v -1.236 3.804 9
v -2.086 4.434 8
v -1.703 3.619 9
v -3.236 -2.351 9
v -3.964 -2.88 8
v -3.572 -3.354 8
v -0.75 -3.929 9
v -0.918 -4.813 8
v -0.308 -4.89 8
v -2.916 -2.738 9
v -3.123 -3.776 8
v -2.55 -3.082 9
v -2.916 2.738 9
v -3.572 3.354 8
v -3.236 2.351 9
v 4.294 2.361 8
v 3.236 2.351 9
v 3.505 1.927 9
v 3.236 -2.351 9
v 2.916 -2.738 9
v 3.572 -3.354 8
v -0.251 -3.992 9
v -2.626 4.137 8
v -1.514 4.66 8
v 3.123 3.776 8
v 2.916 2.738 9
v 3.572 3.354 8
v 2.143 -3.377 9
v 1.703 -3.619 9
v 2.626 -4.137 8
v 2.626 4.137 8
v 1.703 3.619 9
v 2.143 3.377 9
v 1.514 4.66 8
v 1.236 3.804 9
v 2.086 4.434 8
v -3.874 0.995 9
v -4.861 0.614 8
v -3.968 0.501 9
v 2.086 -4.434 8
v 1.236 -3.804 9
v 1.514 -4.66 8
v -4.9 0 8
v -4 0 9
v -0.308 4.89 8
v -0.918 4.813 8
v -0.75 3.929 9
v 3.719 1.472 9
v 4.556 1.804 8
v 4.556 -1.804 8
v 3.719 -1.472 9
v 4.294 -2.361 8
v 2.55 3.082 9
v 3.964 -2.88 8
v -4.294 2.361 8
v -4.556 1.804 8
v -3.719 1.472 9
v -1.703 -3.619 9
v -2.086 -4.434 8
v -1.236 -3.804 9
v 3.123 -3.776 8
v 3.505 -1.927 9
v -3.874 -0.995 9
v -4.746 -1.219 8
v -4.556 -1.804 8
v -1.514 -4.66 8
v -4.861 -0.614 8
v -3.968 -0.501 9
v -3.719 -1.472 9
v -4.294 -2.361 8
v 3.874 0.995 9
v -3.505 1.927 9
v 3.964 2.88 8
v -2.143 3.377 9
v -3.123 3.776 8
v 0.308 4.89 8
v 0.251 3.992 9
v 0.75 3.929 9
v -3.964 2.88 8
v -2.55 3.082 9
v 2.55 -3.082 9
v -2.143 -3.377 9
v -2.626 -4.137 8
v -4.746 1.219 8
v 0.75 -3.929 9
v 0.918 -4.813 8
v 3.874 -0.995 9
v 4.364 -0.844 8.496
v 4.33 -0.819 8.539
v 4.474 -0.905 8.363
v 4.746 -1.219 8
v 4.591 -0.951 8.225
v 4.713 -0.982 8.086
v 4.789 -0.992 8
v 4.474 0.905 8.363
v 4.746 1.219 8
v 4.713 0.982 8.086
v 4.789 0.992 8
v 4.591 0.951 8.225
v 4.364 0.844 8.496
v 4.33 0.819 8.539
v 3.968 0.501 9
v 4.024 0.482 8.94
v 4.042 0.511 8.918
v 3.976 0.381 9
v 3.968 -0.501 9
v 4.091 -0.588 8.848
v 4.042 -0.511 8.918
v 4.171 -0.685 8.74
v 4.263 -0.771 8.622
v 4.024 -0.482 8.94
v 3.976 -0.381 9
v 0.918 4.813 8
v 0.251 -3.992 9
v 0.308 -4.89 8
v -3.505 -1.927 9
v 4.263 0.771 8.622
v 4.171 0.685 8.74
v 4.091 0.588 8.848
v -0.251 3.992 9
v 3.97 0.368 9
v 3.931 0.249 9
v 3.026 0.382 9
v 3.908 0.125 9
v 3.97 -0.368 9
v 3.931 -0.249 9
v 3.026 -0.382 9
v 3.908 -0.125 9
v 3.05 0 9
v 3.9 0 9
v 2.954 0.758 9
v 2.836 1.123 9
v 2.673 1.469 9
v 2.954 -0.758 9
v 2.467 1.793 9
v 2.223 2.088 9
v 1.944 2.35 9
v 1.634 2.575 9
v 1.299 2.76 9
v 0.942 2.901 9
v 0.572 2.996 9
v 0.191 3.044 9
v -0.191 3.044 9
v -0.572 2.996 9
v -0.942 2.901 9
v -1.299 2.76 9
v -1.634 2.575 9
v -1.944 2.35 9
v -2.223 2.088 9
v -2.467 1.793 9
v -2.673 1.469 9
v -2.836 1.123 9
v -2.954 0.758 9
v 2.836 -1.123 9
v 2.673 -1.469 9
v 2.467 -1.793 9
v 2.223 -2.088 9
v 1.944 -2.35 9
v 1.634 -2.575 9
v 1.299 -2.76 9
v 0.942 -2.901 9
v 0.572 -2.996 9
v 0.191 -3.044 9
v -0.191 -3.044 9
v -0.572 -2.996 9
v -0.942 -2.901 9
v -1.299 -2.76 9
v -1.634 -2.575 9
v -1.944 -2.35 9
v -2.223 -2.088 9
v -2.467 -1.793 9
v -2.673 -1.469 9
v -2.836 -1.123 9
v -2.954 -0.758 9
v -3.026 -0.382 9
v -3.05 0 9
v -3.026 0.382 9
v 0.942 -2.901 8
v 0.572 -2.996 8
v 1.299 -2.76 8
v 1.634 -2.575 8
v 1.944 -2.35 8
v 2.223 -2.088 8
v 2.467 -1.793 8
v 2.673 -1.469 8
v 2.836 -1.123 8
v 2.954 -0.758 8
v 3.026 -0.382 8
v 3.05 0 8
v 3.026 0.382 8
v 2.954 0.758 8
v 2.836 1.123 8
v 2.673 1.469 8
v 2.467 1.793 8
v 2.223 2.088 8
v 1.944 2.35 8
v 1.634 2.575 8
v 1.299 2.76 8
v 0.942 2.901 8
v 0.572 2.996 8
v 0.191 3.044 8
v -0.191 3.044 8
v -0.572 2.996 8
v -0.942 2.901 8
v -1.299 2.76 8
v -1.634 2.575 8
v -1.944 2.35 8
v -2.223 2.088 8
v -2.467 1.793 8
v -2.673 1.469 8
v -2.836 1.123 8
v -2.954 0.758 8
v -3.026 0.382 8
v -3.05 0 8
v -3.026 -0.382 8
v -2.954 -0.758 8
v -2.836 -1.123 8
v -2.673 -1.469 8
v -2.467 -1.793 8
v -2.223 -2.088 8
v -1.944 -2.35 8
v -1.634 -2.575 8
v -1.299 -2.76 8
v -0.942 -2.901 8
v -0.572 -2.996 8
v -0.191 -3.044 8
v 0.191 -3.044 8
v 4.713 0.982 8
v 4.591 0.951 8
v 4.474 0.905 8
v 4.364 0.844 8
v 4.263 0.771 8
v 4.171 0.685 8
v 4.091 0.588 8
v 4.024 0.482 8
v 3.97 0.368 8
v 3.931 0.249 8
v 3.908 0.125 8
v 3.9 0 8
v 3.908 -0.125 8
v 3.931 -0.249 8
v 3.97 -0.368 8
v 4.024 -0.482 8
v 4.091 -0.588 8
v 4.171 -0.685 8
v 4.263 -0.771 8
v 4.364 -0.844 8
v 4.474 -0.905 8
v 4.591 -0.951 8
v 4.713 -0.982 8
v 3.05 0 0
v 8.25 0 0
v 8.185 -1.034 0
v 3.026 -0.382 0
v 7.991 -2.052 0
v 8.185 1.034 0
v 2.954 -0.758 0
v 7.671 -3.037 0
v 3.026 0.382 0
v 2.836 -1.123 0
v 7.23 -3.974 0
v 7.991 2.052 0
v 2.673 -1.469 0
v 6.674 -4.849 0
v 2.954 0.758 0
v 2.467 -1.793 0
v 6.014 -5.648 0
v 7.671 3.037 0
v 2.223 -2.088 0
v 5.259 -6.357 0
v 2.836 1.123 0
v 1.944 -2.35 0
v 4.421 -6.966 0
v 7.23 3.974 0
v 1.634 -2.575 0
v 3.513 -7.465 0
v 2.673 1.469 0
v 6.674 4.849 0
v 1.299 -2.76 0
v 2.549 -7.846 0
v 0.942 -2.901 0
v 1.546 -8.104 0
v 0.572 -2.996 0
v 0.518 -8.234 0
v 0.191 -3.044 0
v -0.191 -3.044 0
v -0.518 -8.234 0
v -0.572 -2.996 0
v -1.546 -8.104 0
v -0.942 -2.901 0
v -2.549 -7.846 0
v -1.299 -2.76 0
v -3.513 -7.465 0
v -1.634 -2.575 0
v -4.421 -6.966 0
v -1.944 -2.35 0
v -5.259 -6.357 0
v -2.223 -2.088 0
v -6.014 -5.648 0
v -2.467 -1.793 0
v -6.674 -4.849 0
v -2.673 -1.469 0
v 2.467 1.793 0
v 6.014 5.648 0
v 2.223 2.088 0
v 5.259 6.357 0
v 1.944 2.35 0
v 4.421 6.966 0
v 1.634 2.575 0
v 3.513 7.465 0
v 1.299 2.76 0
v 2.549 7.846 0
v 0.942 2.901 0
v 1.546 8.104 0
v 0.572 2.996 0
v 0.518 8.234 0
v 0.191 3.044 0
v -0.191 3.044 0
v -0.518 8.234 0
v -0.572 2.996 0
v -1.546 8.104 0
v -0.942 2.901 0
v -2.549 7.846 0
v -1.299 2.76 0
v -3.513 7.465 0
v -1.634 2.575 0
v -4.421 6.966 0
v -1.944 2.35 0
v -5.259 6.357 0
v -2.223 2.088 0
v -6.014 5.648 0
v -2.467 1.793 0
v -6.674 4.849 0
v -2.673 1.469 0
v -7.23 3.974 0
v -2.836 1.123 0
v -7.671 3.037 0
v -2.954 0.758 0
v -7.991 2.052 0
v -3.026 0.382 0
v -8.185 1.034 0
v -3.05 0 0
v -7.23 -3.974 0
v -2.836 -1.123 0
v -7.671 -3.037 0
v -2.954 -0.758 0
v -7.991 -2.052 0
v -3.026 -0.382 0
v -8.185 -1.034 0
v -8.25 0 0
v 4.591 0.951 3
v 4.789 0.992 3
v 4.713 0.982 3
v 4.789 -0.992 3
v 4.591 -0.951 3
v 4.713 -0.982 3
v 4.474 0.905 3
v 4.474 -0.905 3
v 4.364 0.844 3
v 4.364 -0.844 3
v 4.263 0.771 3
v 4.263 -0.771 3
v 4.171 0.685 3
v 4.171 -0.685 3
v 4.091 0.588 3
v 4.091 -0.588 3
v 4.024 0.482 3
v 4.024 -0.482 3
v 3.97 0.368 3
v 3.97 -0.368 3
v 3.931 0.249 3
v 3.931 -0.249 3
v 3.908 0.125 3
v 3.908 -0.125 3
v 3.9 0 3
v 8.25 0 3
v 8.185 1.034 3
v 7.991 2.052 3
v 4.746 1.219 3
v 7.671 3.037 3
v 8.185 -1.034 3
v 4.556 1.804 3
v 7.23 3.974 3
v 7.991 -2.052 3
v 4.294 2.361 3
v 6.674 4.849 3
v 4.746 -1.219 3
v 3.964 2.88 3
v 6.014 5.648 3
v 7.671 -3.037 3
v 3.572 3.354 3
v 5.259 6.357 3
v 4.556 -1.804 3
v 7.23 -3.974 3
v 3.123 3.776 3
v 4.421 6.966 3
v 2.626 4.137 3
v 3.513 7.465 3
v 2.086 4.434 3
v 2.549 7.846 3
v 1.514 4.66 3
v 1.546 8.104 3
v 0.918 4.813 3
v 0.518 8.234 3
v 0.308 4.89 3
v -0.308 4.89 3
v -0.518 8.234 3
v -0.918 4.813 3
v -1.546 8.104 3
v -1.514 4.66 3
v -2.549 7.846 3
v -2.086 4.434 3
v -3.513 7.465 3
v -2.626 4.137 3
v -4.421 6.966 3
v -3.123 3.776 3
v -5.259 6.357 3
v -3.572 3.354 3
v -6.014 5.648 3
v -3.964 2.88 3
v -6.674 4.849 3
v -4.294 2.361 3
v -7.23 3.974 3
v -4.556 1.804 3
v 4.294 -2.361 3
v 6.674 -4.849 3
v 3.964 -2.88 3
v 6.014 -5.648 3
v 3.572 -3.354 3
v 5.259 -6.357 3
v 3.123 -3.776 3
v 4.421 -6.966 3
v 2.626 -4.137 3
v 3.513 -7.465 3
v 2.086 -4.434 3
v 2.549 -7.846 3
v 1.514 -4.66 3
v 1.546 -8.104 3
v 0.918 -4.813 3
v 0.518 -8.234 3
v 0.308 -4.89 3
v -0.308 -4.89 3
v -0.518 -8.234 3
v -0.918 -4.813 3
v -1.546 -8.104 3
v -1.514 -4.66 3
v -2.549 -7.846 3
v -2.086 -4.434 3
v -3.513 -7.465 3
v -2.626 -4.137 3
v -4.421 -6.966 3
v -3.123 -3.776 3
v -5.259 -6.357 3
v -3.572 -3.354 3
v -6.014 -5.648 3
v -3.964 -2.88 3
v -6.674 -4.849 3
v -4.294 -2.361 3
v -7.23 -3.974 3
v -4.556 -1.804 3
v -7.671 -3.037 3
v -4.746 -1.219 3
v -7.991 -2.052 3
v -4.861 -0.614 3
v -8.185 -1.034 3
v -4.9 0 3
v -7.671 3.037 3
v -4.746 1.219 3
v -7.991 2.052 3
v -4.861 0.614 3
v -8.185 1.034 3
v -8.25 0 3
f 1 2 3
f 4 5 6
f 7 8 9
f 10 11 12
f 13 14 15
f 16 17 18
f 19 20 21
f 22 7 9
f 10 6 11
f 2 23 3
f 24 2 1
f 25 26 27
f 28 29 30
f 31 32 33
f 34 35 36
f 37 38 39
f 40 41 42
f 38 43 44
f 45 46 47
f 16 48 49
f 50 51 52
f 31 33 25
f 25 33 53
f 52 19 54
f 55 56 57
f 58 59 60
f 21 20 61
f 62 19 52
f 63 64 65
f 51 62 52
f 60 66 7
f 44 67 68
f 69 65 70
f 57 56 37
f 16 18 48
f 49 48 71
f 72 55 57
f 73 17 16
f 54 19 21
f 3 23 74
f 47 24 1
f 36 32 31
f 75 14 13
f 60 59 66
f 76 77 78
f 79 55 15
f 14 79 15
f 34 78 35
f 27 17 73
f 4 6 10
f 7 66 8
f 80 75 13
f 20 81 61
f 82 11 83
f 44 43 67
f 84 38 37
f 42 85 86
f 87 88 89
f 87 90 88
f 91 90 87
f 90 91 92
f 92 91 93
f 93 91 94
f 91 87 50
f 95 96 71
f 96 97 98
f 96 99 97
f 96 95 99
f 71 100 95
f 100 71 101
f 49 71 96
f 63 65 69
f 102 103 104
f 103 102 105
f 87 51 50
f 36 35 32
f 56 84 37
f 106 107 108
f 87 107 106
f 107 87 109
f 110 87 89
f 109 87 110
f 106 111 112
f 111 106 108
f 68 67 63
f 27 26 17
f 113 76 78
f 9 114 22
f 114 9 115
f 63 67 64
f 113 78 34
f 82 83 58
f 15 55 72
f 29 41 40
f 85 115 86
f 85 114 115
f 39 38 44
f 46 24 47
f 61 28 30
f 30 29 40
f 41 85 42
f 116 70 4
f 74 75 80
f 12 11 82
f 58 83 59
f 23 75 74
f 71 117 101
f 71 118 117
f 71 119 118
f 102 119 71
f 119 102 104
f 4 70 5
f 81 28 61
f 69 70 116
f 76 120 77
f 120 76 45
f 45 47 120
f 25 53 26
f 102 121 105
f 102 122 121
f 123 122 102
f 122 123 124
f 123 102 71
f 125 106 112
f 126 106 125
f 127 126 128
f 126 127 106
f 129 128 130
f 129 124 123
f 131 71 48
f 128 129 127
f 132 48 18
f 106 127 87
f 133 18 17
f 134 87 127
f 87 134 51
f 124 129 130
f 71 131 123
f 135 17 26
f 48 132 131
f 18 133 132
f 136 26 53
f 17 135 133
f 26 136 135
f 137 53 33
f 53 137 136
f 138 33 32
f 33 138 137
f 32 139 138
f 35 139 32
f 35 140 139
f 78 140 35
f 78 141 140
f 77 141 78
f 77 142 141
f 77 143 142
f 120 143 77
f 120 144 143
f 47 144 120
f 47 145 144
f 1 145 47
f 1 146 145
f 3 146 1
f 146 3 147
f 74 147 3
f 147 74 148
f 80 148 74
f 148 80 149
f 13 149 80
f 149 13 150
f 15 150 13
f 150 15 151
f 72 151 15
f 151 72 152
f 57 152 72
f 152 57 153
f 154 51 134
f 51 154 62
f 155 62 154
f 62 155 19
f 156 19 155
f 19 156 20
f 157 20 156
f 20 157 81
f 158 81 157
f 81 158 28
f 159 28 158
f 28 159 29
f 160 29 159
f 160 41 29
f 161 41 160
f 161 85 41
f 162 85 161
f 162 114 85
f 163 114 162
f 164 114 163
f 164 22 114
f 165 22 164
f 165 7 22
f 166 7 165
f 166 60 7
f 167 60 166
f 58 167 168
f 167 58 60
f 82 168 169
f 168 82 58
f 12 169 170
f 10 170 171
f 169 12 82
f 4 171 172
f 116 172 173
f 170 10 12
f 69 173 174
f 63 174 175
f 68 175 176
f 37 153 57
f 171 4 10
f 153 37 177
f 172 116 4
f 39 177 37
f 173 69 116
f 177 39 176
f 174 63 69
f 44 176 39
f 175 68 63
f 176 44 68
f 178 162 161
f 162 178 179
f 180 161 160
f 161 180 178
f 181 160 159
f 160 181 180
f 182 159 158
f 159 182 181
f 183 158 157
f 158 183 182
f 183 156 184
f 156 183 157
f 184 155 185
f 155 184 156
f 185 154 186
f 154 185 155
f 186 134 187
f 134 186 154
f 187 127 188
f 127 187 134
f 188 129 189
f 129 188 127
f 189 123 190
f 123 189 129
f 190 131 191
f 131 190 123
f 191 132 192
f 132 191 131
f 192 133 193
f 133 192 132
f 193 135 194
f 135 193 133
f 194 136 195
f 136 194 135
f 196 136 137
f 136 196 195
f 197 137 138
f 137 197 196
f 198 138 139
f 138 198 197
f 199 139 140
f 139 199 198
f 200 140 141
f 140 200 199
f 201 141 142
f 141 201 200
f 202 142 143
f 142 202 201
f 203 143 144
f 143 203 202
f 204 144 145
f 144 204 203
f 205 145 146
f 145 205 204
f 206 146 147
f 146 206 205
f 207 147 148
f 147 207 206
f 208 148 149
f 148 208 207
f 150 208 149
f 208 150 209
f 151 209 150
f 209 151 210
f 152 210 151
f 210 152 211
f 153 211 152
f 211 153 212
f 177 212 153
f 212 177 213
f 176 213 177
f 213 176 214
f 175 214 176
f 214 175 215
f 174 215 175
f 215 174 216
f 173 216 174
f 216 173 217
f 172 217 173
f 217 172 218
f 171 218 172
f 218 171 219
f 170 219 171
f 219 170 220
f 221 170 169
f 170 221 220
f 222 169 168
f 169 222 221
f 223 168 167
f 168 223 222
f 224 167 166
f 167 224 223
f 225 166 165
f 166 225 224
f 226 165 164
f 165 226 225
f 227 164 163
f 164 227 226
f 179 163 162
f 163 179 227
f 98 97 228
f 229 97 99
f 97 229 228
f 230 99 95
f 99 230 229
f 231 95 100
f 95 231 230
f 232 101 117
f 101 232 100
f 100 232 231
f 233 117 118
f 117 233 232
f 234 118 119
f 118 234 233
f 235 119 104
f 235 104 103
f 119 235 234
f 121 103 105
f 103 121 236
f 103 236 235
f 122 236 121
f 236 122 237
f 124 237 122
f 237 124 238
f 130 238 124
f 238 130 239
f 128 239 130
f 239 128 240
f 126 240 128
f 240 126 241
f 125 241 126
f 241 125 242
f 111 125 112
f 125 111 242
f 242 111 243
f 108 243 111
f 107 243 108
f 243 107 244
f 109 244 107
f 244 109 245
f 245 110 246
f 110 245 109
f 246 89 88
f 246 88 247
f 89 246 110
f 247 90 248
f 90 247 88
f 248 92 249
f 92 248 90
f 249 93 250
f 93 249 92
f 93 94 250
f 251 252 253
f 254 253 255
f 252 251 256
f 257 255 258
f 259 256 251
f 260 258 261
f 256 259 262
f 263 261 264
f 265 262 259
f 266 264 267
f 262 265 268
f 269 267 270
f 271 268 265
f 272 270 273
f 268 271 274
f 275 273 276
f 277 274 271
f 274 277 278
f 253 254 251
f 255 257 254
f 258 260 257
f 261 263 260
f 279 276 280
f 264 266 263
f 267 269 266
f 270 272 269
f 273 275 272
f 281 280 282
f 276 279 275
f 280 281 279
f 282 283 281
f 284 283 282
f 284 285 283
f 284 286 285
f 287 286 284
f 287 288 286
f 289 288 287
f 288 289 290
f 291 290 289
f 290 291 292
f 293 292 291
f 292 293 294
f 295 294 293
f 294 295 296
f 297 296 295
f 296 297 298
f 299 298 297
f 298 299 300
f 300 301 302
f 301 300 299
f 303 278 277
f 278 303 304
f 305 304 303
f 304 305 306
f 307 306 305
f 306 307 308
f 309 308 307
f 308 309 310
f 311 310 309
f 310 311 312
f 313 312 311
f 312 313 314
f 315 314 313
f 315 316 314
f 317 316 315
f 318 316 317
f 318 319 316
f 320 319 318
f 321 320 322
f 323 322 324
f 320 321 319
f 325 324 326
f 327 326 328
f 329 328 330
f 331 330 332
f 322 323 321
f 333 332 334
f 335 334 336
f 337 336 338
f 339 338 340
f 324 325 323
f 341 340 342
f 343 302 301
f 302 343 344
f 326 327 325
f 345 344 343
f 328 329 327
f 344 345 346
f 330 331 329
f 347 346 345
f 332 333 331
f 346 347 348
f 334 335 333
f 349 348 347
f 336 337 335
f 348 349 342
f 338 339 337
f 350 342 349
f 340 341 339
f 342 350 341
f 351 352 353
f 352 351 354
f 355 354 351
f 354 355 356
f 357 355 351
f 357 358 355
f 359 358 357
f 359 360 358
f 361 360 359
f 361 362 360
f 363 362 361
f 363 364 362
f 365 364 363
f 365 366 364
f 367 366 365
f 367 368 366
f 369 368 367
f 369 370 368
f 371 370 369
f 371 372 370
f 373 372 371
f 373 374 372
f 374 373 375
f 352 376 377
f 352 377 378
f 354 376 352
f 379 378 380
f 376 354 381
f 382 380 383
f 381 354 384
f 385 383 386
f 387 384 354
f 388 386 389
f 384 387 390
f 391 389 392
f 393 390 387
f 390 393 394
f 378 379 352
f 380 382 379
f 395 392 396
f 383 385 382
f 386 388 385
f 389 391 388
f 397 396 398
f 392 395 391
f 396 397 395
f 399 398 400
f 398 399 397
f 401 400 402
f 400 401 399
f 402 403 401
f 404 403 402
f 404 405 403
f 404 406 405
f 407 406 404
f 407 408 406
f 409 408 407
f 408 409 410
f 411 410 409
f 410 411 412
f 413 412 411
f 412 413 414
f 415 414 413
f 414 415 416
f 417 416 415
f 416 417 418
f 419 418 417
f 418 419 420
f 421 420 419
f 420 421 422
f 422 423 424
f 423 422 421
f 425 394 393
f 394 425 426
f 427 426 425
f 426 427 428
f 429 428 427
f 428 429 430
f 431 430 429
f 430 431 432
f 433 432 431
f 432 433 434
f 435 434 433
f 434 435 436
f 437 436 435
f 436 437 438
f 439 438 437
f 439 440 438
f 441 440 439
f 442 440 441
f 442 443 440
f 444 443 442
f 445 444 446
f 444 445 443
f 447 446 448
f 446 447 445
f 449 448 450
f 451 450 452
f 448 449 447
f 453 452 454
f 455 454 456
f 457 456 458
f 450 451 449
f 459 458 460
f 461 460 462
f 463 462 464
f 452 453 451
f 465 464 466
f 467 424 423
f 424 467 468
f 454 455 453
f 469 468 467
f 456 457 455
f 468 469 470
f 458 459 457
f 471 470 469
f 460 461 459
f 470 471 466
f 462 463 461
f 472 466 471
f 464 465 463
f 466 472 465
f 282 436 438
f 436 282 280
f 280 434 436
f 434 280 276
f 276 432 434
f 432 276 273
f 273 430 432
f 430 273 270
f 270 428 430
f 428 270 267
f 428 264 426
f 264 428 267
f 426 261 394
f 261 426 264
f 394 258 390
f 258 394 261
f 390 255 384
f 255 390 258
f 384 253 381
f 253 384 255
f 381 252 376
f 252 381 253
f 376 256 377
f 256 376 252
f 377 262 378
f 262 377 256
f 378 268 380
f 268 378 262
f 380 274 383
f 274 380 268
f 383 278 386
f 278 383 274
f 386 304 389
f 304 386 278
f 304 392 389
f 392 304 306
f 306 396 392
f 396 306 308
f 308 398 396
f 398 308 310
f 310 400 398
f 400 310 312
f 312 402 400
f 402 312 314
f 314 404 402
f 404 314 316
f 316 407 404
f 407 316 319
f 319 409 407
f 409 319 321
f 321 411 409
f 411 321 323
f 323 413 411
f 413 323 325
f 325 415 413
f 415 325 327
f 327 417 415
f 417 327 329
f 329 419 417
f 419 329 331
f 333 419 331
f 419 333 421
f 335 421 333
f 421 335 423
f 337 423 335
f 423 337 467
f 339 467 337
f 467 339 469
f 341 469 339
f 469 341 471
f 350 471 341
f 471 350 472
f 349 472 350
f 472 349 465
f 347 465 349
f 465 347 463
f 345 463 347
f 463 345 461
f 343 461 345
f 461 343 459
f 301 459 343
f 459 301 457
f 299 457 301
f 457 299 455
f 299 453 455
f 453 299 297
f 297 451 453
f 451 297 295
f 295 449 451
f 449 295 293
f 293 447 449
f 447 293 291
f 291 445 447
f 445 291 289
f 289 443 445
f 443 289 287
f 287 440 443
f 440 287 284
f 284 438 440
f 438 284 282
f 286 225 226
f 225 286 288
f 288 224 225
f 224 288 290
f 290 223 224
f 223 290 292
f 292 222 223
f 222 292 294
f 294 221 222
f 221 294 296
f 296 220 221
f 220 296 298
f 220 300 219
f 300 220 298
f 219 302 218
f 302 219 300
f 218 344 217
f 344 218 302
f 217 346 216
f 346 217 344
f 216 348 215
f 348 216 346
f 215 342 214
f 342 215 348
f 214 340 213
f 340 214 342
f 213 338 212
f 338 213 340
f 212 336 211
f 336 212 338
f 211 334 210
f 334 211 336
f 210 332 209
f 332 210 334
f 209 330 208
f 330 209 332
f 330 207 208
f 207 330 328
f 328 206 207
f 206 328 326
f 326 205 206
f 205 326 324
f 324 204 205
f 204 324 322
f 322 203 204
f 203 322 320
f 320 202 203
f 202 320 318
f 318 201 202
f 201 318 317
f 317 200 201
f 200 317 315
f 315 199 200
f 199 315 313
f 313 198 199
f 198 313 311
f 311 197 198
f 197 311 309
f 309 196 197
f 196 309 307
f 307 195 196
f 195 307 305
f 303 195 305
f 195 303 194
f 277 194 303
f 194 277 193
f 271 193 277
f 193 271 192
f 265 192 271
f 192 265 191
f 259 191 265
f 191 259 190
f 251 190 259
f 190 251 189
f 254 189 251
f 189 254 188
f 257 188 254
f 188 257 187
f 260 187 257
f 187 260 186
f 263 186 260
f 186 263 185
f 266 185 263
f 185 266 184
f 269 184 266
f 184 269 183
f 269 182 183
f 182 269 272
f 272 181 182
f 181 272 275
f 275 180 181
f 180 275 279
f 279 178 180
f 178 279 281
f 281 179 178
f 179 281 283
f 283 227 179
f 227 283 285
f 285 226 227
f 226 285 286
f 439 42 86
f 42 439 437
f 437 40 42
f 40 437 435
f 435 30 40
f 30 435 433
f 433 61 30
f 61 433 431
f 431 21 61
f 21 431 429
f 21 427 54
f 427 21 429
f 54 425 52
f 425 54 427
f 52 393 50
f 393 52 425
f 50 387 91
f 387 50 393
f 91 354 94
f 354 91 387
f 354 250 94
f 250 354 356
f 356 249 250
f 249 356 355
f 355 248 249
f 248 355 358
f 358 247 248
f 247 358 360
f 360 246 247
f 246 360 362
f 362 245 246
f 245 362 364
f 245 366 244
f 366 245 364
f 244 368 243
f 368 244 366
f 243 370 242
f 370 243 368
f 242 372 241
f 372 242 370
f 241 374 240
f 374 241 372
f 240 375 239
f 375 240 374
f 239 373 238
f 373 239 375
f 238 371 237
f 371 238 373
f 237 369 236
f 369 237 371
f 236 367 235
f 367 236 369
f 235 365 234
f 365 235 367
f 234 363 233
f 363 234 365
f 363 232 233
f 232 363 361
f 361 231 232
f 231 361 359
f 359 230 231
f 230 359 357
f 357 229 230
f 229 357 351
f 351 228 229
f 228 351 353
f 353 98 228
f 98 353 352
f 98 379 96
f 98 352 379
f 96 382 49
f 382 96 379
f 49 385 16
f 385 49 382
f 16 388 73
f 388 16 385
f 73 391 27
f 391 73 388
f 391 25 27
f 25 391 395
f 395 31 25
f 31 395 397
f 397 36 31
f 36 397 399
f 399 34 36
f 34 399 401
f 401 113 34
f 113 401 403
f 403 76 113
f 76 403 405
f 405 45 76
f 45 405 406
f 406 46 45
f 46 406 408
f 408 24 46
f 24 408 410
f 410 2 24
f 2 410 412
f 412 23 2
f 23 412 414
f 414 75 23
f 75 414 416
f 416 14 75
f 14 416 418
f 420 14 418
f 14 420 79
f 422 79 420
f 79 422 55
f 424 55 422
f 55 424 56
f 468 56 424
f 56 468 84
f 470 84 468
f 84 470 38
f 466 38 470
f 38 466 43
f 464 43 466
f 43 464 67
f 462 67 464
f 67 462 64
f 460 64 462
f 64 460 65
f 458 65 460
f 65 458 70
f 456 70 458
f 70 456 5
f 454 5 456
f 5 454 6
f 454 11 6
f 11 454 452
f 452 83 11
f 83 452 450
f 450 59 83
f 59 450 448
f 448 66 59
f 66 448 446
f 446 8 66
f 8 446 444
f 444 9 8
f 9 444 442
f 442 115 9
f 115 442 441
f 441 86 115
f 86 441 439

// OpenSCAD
$fn=50;

linear_extrude(3) difference(){
  circle(d=16.5);
  circle(d=6.1);
}

linear_extrude(8) difference(){
  circle(d=9.8);
  circle(d=6.1);
  translate([9.8/2,0]) circle(d=2);
}

difference(){
  translate([0,0,8]) cylinder(d1=9.8,d2=8,h=1);
  linear_extrude(10){
    translate([9.8/2,0]) circle(d=2);
    circle(d=6.1);
  }
}
